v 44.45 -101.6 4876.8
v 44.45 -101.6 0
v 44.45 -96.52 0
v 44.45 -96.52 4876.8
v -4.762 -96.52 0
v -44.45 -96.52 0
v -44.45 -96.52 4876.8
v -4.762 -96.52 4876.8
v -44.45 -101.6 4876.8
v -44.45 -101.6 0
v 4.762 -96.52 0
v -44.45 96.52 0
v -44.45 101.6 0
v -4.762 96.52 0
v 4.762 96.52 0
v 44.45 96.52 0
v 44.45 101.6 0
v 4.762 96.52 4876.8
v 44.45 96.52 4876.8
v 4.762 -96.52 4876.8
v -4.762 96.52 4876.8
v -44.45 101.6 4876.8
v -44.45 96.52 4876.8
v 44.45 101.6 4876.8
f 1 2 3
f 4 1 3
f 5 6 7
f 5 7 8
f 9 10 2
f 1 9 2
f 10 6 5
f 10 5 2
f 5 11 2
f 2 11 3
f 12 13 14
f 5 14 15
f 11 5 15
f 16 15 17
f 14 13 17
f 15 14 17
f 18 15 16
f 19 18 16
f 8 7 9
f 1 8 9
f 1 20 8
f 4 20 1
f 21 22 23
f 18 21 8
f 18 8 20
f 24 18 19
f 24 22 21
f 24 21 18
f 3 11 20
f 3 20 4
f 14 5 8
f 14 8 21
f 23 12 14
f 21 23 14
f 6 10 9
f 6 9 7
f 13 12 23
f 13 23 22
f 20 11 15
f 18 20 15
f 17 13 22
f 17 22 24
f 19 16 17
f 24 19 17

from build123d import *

# Parameters (mm, degrees)
F0_W     = 88.9
F0_H     = 203.2
F1_DEPTH = 4876.8
F2_W     = 39.6875
F2_H     = 193.04
F3_DEPTH = 4876.801


with BuildPart() as f1:
    # F0 (on Top) → F1 (new body)
    with BuildSketch(Plane.XY):
        Rectangle(F0_W, F0_H)
    extrude(amount=F1_DEPTH)

    # F2 (on Top) → F3 (cut, through all)
    with BuildSketch(Plane.XY):
        with Locations((-24.60625, 0)):
            Rectangle(F2_W, F2_H)
        with Locations((24.60625, 0)):
            Rectangle(F2_W, F2_H)
    extrude(amount=F3_DEPTH, mode=Mode.SUBTRACT)


solid = f1.part
